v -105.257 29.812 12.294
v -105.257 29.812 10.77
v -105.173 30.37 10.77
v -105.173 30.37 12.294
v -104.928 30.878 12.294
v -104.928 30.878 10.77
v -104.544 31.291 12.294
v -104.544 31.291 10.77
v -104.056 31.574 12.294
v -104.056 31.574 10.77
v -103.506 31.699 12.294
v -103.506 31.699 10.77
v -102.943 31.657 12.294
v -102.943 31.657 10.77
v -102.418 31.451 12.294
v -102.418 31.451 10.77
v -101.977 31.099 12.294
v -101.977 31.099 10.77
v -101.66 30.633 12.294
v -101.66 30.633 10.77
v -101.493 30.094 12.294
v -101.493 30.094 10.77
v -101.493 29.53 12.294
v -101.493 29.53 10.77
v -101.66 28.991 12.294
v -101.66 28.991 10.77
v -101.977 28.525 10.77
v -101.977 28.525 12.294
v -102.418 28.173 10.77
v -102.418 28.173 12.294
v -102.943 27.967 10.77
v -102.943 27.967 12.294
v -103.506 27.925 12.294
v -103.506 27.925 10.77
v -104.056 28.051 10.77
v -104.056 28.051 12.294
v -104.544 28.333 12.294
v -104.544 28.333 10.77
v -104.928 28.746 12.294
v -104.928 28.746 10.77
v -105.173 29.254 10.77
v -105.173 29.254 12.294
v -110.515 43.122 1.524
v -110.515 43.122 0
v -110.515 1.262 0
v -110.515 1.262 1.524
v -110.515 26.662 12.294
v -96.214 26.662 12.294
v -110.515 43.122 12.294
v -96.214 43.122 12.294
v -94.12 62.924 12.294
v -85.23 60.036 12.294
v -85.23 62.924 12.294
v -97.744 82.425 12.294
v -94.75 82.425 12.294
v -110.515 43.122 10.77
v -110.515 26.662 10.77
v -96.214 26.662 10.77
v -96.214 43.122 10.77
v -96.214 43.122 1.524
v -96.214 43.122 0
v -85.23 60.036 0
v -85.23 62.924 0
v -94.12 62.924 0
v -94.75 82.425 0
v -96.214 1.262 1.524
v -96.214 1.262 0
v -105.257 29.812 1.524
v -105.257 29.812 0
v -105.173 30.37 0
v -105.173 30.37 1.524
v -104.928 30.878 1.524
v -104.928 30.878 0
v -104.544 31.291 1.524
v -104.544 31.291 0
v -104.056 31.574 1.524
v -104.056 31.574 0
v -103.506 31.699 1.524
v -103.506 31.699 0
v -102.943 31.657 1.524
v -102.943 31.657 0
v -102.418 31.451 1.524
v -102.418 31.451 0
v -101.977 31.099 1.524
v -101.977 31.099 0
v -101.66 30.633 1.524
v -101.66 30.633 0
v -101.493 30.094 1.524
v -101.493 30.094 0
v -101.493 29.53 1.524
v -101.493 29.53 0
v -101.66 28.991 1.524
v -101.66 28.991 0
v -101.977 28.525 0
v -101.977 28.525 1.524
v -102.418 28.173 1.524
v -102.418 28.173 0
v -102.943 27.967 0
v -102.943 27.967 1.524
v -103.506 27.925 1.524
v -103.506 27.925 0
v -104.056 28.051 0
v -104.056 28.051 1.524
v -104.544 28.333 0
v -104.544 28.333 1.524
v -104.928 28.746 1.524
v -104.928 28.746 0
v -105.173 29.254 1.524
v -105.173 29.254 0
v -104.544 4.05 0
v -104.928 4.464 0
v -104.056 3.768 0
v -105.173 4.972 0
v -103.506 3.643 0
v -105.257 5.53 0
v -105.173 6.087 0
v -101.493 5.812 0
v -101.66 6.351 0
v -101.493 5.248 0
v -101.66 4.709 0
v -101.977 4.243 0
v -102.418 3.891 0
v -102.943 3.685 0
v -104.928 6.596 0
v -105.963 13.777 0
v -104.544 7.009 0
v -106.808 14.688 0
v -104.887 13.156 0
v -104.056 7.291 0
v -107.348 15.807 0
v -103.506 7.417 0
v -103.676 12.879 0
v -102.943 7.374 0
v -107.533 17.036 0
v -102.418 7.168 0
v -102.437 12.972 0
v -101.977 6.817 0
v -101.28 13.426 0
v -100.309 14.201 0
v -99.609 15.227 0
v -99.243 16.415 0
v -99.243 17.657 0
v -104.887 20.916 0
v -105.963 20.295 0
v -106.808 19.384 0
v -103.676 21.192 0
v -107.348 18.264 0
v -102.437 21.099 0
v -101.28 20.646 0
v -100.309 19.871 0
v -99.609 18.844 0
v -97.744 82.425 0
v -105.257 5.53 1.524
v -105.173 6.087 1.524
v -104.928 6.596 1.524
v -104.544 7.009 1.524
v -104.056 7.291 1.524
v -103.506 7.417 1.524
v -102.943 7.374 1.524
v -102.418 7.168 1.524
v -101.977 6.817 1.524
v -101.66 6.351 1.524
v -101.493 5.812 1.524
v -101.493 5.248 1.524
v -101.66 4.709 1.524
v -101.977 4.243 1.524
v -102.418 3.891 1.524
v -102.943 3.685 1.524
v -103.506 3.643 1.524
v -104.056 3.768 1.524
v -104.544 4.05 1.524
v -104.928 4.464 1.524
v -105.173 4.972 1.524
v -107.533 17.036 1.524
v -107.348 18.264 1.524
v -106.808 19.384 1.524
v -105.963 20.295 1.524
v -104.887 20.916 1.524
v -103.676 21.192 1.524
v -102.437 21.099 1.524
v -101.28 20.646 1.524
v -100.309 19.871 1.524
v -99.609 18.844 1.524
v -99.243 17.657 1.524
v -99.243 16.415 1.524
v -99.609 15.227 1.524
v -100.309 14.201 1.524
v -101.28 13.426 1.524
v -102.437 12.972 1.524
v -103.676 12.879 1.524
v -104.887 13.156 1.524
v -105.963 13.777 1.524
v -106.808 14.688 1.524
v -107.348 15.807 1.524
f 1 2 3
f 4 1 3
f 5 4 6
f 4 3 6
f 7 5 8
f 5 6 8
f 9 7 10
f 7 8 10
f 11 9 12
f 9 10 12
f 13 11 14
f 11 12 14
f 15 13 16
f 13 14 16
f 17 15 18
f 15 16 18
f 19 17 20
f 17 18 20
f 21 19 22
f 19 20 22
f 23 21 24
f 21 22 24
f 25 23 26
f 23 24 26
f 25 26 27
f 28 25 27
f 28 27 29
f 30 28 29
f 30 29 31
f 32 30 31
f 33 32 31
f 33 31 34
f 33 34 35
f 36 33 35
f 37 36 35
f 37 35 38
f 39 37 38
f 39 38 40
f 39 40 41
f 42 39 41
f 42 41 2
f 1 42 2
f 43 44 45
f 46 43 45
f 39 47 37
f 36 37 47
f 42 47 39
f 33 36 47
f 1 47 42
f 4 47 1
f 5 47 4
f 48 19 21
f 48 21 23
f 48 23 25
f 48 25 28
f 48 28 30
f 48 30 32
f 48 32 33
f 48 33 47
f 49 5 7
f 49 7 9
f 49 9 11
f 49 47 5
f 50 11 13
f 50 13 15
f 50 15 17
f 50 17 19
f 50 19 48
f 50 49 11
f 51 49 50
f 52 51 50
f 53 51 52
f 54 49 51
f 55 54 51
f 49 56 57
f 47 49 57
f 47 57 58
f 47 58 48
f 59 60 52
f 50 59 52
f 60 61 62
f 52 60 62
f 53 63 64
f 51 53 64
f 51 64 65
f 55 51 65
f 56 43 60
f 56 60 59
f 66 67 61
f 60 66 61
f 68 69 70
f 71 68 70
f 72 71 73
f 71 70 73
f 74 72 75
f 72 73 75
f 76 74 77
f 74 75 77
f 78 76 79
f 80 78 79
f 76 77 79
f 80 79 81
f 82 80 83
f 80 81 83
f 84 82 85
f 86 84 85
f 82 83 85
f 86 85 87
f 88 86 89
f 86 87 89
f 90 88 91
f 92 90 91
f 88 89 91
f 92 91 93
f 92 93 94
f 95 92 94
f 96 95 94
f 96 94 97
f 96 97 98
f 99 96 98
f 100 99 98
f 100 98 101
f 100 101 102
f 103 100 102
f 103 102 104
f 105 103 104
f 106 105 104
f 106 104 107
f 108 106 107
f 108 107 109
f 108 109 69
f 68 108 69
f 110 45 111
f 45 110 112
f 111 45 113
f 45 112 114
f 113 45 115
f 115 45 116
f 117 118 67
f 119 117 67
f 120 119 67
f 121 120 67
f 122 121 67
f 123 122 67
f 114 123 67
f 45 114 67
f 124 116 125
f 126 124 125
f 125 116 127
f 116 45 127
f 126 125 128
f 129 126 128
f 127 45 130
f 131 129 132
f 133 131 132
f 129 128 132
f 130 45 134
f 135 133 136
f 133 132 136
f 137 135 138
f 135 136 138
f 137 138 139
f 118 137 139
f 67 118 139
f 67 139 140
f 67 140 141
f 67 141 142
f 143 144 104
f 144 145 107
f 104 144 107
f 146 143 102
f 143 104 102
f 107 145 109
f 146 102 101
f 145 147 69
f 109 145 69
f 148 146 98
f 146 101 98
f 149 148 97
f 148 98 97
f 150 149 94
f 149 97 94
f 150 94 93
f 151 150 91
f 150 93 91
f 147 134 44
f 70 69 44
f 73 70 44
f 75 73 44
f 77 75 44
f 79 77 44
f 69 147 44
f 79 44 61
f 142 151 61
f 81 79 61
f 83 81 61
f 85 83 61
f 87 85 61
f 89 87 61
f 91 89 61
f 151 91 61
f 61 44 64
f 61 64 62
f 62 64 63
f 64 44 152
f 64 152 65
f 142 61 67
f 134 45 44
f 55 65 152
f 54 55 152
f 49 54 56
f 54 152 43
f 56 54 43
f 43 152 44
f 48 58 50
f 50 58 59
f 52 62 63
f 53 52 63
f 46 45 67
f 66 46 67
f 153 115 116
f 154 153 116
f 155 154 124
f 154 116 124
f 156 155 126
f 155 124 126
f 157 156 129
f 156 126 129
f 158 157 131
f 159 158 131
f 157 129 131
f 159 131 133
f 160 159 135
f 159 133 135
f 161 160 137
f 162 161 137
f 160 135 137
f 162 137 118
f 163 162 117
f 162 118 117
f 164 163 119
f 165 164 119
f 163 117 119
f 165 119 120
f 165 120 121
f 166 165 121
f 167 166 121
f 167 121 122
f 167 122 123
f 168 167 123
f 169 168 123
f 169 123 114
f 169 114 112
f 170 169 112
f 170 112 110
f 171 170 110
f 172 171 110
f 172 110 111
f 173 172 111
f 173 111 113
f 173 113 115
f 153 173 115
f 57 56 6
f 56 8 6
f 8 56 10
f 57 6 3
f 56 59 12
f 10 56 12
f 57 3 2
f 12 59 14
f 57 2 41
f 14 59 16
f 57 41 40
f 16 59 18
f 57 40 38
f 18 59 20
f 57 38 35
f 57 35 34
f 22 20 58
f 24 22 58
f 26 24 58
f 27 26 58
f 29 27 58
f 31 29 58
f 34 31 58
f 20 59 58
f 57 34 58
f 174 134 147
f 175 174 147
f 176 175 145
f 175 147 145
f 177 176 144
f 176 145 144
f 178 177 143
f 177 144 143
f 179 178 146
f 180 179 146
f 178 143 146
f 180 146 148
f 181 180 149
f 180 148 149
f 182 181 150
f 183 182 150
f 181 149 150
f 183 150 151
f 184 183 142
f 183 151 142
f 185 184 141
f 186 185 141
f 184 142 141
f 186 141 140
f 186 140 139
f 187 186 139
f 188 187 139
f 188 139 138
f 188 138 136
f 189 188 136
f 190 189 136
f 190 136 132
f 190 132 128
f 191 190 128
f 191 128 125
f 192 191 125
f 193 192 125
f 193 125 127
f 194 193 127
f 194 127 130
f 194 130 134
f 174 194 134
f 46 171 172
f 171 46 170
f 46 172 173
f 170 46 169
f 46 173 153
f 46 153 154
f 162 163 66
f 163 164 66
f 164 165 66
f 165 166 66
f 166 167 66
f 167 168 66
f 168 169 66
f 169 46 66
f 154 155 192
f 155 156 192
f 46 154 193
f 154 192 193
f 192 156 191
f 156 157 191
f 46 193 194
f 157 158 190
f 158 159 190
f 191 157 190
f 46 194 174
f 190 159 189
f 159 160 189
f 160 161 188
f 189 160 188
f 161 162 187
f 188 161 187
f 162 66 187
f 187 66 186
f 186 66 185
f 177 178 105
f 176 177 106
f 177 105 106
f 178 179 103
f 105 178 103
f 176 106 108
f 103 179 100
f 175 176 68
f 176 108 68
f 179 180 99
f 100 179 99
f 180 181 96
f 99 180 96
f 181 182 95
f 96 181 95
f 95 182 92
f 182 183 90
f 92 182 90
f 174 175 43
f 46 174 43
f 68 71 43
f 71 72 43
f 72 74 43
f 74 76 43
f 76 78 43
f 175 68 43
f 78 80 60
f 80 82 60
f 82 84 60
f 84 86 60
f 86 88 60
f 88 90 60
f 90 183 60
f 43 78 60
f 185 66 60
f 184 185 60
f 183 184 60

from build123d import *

# Parameters (mm, degrees)
BOSS_EXTRUDE3_DEPTH = 12.2936
CUT_EXTRUDE3_DEPTH  = 14.3002
SKETCH3_R           = 1.8923
SKETCH3_R_2         = 4.16814
CUT_EXTRUDE4_DEPTH  = 14.3002


with BuildPart() as part:
    # Sketch1 → Boss-Extrude3 (new body)
    with BuildSketch(Plane.XY):
        Polygon((-110.51464309, 1.262410177), (-96.21444309, 1.262410177), (-96.21444309, 43.121610177), (-85.230380887, 60.035582724), (-85.230380887, 62.924026373), (-94.120096356, 62.924026373), (-94.749967174, 82.424781559), (-97.744268584, 82.424781559), (-110.51464309, 43.121610177), align=None)
    extrude(amount=BOSS_EXTRUDE3_DEPTH)

    # Sketch2 → Cut-Extrude3 (cut)
    with BuildSketch(Plane(origin=(-96.21444309, 0, 0), x_dir=(0, 0, -1), z_dir=(1, 0, 0))):
        Polygon((-12.2936, 26.662410177), (-12.2936, 1.262410177), (-10.7696, 1.262410177), (-1.524, 1.262410177), (-1.524, 43.121610177), (-10.7696, 43.121610177), (-10.7696, 26.662410177), align=None)
    extrude(amount=-CUT_EXTRUDE3_DEPTH, mode=Mode.SUBTRACT)

    # Sketch3 → Cut-Extrude4 (cut)
    with BuildSketch(Plane(origin=(0, 0, 0), x_dir=(-1, 0, 0), z_dir=(0, 0, -1))):
        with Locations((103.36454309, 5.529610177)):
            Circle(SKETCH3_R)
        with Locations((103.36454309, 29.812010177)):
            Circle(SKETCH3_R)
        with Locations((103.36454309, 17.035810177)):
            Circle(SKETCH3_R_2)
    extrude(amount=-CUT_EXTRUDE4_DEPTH, mode=Mode.SUBTRACT)


solid = part.part
